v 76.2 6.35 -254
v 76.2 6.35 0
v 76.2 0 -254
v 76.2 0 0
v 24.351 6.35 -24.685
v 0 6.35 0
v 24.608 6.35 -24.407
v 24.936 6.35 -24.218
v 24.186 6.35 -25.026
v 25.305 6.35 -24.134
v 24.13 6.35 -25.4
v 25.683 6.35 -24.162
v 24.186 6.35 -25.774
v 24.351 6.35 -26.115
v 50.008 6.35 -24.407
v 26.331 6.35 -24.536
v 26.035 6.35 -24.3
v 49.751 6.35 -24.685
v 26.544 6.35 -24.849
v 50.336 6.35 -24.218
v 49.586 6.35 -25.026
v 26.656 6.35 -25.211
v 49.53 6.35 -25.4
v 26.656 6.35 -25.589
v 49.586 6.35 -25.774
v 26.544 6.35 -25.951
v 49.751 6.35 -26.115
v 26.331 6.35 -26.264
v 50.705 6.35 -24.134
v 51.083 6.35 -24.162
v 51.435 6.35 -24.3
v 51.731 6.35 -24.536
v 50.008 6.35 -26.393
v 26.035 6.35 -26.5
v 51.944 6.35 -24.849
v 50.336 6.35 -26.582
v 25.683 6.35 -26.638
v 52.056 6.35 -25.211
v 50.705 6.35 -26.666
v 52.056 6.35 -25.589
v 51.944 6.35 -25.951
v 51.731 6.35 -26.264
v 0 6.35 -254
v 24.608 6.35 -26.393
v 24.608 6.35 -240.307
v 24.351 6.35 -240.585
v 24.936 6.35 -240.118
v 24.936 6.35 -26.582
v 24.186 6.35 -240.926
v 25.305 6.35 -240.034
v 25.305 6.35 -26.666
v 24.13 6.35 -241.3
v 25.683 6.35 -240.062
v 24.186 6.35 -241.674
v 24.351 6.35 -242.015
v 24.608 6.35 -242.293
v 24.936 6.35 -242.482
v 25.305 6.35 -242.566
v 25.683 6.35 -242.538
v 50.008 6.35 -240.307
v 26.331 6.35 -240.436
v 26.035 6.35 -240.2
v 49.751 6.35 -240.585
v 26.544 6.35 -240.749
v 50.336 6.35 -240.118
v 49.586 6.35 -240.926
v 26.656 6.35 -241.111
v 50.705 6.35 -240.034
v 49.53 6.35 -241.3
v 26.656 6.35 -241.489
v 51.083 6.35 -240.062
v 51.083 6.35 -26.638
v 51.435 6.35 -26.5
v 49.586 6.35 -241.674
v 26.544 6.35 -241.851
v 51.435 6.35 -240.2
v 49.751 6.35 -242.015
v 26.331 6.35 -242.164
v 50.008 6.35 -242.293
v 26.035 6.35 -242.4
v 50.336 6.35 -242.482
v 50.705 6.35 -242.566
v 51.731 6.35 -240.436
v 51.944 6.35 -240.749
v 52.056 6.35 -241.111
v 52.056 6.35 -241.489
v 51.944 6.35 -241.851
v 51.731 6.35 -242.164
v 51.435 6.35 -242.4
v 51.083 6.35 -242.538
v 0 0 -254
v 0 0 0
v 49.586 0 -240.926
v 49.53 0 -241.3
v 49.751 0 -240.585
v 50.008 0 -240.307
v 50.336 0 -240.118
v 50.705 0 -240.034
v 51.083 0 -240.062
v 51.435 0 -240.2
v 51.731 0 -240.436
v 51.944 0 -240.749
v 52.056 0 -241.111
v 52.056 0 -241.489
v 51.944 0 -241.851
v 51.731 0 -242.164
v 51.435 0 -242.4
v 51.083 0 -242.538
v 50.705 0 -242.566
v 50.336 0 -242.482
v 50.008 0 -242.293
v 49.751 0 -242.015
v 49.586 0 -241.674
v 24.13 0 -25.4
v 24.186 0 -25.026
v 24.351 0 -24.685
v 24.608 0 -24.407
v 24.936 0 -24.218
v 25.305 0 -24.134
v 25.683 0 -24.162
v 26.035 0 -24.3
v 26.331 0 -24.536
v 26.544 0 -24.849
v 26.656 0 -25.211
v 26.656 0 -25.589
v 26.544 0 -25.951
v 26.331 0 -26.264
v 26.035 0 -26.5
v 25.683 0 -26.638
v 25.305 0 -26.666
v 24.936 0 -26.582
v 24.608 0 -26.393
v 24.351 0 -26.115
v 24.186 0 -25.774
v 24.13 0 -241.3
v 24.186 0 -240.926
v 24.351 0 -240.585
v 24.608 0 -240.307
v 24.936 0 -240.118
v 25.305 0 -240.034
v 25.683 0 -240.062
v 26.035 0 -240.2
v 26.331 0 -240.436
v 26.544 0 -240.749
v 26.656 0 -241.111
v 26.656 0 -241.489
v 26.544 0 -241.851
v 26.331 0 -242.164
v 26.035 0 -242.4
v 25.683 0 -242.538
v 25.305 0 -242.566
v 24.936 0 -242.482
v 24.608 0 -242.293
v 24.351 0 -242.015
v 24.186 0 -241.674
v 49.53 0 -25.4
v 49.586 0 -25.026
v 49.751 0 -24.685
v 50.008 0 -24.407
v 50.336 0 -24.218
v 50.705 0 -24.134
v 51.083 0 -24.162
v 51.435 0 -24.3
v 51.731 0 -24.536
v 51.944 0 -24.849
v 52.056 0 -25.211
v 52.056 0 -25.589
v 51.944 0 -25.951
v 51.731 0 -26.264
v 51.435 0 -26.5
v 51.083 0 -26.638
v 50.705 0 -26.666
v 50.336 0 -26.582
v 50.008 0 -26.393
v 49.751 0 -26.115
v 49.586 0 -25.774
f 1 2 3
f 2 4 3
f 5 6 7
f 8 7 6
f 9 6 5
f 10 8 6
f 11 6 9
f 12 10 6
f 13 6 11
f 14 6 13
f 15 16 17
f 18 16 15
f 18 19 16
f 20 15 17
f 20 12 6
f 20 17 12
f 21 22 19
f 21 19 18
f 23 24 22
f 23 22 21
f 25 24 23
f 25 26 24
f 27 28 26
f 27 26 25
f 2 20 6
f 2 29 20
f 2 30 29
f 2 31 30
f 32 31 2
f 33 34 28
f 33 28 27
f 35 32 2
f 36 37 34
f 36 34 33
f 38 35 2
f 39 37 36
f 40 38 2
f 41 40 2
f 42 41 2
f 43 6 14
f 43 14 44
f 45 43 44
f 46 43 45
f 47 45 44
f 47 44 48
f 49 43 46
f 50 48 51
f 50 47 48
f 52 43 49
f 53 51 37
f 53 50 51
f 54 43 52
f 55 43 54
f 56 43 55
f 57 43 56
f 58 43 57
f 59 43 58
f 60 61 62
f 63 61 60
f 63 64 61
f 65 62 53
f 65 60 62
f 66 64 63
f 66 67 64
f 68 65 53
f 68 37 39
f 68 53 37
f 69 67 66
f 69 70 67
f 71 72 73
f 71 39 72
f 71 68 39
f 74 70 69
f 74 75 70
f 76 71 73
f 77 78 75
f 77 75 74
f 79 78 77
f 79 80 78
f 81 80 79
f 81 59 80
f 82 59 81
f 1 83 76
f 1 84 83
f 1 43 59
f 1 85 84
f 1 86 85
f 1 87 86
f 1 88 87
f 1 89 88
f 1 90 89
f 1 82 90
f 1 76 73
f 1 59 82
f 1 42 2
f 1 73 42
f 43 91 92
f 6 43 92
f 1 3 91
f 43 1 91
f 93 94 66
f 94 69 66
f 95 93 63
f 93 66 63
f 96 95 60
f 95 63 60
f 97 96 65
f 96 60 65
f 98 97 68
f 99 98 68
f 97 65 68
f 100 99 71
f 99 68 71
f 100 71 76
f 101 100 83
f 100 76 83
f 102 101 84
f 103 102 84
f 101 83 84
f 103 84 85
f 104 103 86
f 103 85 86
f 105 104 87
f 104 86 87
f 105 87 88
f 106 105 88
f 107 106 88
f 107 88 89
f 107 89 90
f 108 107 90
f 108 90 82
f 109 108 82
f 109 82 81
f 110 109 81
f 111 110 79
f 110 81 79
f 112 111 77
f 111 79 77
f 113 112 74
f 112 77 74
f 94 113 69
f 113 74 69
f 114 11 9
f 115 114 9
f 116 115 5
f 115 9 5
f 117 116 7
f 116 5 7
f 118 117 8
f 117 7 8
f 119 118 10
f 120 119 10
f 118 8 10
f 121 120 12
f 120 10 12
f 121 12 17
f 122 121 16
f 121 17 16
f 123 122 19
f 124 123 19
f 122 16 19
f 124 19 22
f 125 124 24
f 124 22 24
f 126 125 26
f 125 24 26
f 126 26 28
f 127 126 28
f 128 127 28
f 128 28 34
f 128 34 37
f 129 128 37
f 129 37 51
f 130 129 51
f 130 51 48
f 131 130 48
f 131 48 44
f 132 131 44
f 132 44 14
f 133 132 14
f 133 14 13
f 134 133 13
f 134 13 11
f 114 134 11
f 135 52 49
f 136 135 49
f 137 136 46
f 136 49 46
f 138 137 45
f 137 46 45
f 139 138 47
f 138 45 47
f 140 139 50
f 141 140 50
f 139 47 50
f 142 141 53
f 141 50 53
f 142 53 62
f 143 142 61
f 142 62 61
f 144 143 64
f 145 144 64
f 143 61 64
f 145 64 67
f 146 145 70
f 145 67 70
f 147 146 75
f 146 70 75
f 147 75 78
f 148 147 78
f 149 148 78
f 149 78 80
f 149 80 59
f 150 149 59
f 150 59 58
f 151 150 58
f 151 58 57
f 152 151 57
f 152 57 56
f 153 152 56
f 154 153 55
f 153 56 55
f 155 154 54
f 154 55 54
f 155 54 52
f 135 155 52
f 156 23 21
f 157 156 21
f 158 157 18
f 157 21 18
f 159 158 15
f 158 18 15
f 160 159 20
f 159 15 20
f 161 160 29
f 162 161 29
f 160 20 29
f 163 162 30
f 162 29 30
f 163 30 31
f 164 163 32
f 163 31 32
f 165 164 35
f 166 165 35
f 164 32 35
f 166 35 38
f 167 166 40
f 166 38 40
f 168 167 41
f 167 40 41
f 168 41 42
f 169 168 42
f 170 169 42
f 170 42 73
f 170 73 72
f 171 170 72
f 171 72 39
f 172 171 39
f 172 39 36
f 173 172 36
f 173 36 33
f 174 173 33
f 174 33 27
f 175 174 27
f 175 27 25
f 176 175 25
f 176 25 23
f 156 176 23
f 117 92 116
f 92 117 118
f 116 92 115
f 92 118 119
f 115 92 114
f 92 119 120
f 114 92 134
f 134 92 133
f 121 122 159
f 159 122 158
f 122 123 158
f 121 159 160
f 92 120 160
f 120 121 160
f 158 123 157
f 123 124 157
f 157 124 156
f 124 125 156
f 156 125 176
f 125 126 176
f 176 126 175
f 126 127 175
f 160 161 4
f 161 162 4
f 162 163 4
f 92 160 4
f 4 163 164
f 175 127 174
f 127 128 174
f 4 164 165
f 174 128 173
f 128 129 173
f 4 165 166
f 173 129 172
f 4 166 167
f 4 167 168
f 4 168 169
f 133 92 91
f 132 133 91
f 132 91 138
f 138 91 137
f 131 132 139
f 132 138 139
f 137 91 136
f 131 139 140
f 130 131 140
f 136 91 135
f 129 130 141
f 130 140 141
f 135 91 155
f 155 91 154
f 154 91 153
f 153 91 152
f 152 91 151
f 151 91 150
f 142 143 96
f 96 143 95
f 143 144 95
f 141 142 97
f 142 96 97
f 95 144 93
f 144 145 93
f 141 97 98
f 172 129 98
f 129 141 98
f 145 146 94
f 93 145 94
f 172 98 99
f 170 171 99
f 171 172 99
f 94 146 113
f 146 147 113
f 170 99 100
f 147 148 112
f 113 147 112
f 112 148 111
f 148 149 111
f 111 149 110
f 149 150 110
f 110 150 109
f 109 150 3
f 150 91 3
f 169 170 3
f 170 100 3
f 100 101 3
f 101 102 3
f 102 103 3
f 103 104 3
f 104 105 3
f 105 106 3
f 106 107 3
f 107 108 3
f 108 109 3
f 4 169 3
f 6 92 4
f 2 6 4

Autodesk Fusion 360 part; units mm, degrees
sketch "Sketch1" plane through (0, 0, 0) normal (0, 1, 0) x (1, 0, 0)
  line L0 (0, 0) -> (76.2, 0)
  line L1 (76.2, 0) -> (76.2, 254)
  line L2 (76.2, 254) -> (0, 254)
  line L3 (0, 254) -> (0, 0)
extrude "Extrude1" add sketch "Sketch1" along normal blind 6.35
sketch "Sketch2" plane through (0, 6.35, 0) normal (0, 1, 0) x (-1, 0, 0)
  line L0 (0, -254) -> (0, 0)
  line L1 (0, 0) -> (-76.2, 0)
  line L2 (-76.2, 0) -> (-76.2, -254)
  line L3 (-76.2, -254) -> (0, -254)
  circle A0 centre (-25.4, -25.4) radius 1.27
  circle A1 centre (-50.8, -25.4) radius 1.27
  circle A2 centre (-25.4, -241.3) radius 1.27
  circle A3 centre (-50.8, -241.3) radius 1.27
  dimension "d3" = 2.54
  dimension "d4" = 2.54
  dimension "d5" = 2.54
  dimension "d6" = 2.54
extrude "Extrude2" cut sketch "Sketch2" against normal blind 6.35 contours A0
sketch "Sketch3" plane through (0, 6.35, 0) normal (0, 1, 0) x (-1, 0, 0)
  circle A0 centre (-25.4, -25.4) radius 1.27
  line L0 (0, -254) -> (0, 0)
  line L1 (0, 0) -> (-76.2, 0)
  line L2 (-76.2, 0) -> (-76.2, -254)
  line L3 (-76.2, -254) -> (0, -254)
  circle A1 centre (-50.8, -25.4) radius 1.27
  dimension "d9" = 2.54
extrude "Extrude3" cut sketch "Sketch3" against normal blind 6.35 contours A1
sketch "Sketch4" plane through (0, 6.35, 0) normal (0, 1, 0) x (-1, 0, 0)
  circle A0 centre (-50.8, -25.4) radius 1.27
  circle A1 centre (-25.4, -25.4) radius 1.27
  line L0 (0, -254) -> (0, 0)
  line L1 (0, 0) -> (-76.2, 0)
  line L2 (-76.2, 0) -> (-76.2, -254)
  line L3 (-76.2, -254) -> (0, -254)
  circle A2 centre (-25.4, -241.3) radius 1.27
  dimension "d12" = 2.54
extrude "Extrude4" cut sketch "Sketch4" against normal blind 6.35 contours A2
sketch "Sketch5" plane through (0, 6.35, 0) normal (0, 1, 0) x (-1, 0, 0)
  circle A0 centre (-25.4, -241.3) radius 1.27
  circle A1 centre (-50.8, -25.4) radius 1.27
  circle A2 centre (-25.4, -25.4) radius 1.27
  line L0 (0, -254) -> (0, 0)
  line L1 (0, 0) -> (-76.2, 0)
  line L2 (-76.2, 0) -> (-76.2, -254)
  line L3 (-76.2, -254) -> (0, -254)
  circle A3 centre (-50.8, -241.3) radius 1.27
  dimension "d15" = 2.54
extrude "Extrude5" cut sketch "Sketch5" against normal blind 6.35 contours A3
